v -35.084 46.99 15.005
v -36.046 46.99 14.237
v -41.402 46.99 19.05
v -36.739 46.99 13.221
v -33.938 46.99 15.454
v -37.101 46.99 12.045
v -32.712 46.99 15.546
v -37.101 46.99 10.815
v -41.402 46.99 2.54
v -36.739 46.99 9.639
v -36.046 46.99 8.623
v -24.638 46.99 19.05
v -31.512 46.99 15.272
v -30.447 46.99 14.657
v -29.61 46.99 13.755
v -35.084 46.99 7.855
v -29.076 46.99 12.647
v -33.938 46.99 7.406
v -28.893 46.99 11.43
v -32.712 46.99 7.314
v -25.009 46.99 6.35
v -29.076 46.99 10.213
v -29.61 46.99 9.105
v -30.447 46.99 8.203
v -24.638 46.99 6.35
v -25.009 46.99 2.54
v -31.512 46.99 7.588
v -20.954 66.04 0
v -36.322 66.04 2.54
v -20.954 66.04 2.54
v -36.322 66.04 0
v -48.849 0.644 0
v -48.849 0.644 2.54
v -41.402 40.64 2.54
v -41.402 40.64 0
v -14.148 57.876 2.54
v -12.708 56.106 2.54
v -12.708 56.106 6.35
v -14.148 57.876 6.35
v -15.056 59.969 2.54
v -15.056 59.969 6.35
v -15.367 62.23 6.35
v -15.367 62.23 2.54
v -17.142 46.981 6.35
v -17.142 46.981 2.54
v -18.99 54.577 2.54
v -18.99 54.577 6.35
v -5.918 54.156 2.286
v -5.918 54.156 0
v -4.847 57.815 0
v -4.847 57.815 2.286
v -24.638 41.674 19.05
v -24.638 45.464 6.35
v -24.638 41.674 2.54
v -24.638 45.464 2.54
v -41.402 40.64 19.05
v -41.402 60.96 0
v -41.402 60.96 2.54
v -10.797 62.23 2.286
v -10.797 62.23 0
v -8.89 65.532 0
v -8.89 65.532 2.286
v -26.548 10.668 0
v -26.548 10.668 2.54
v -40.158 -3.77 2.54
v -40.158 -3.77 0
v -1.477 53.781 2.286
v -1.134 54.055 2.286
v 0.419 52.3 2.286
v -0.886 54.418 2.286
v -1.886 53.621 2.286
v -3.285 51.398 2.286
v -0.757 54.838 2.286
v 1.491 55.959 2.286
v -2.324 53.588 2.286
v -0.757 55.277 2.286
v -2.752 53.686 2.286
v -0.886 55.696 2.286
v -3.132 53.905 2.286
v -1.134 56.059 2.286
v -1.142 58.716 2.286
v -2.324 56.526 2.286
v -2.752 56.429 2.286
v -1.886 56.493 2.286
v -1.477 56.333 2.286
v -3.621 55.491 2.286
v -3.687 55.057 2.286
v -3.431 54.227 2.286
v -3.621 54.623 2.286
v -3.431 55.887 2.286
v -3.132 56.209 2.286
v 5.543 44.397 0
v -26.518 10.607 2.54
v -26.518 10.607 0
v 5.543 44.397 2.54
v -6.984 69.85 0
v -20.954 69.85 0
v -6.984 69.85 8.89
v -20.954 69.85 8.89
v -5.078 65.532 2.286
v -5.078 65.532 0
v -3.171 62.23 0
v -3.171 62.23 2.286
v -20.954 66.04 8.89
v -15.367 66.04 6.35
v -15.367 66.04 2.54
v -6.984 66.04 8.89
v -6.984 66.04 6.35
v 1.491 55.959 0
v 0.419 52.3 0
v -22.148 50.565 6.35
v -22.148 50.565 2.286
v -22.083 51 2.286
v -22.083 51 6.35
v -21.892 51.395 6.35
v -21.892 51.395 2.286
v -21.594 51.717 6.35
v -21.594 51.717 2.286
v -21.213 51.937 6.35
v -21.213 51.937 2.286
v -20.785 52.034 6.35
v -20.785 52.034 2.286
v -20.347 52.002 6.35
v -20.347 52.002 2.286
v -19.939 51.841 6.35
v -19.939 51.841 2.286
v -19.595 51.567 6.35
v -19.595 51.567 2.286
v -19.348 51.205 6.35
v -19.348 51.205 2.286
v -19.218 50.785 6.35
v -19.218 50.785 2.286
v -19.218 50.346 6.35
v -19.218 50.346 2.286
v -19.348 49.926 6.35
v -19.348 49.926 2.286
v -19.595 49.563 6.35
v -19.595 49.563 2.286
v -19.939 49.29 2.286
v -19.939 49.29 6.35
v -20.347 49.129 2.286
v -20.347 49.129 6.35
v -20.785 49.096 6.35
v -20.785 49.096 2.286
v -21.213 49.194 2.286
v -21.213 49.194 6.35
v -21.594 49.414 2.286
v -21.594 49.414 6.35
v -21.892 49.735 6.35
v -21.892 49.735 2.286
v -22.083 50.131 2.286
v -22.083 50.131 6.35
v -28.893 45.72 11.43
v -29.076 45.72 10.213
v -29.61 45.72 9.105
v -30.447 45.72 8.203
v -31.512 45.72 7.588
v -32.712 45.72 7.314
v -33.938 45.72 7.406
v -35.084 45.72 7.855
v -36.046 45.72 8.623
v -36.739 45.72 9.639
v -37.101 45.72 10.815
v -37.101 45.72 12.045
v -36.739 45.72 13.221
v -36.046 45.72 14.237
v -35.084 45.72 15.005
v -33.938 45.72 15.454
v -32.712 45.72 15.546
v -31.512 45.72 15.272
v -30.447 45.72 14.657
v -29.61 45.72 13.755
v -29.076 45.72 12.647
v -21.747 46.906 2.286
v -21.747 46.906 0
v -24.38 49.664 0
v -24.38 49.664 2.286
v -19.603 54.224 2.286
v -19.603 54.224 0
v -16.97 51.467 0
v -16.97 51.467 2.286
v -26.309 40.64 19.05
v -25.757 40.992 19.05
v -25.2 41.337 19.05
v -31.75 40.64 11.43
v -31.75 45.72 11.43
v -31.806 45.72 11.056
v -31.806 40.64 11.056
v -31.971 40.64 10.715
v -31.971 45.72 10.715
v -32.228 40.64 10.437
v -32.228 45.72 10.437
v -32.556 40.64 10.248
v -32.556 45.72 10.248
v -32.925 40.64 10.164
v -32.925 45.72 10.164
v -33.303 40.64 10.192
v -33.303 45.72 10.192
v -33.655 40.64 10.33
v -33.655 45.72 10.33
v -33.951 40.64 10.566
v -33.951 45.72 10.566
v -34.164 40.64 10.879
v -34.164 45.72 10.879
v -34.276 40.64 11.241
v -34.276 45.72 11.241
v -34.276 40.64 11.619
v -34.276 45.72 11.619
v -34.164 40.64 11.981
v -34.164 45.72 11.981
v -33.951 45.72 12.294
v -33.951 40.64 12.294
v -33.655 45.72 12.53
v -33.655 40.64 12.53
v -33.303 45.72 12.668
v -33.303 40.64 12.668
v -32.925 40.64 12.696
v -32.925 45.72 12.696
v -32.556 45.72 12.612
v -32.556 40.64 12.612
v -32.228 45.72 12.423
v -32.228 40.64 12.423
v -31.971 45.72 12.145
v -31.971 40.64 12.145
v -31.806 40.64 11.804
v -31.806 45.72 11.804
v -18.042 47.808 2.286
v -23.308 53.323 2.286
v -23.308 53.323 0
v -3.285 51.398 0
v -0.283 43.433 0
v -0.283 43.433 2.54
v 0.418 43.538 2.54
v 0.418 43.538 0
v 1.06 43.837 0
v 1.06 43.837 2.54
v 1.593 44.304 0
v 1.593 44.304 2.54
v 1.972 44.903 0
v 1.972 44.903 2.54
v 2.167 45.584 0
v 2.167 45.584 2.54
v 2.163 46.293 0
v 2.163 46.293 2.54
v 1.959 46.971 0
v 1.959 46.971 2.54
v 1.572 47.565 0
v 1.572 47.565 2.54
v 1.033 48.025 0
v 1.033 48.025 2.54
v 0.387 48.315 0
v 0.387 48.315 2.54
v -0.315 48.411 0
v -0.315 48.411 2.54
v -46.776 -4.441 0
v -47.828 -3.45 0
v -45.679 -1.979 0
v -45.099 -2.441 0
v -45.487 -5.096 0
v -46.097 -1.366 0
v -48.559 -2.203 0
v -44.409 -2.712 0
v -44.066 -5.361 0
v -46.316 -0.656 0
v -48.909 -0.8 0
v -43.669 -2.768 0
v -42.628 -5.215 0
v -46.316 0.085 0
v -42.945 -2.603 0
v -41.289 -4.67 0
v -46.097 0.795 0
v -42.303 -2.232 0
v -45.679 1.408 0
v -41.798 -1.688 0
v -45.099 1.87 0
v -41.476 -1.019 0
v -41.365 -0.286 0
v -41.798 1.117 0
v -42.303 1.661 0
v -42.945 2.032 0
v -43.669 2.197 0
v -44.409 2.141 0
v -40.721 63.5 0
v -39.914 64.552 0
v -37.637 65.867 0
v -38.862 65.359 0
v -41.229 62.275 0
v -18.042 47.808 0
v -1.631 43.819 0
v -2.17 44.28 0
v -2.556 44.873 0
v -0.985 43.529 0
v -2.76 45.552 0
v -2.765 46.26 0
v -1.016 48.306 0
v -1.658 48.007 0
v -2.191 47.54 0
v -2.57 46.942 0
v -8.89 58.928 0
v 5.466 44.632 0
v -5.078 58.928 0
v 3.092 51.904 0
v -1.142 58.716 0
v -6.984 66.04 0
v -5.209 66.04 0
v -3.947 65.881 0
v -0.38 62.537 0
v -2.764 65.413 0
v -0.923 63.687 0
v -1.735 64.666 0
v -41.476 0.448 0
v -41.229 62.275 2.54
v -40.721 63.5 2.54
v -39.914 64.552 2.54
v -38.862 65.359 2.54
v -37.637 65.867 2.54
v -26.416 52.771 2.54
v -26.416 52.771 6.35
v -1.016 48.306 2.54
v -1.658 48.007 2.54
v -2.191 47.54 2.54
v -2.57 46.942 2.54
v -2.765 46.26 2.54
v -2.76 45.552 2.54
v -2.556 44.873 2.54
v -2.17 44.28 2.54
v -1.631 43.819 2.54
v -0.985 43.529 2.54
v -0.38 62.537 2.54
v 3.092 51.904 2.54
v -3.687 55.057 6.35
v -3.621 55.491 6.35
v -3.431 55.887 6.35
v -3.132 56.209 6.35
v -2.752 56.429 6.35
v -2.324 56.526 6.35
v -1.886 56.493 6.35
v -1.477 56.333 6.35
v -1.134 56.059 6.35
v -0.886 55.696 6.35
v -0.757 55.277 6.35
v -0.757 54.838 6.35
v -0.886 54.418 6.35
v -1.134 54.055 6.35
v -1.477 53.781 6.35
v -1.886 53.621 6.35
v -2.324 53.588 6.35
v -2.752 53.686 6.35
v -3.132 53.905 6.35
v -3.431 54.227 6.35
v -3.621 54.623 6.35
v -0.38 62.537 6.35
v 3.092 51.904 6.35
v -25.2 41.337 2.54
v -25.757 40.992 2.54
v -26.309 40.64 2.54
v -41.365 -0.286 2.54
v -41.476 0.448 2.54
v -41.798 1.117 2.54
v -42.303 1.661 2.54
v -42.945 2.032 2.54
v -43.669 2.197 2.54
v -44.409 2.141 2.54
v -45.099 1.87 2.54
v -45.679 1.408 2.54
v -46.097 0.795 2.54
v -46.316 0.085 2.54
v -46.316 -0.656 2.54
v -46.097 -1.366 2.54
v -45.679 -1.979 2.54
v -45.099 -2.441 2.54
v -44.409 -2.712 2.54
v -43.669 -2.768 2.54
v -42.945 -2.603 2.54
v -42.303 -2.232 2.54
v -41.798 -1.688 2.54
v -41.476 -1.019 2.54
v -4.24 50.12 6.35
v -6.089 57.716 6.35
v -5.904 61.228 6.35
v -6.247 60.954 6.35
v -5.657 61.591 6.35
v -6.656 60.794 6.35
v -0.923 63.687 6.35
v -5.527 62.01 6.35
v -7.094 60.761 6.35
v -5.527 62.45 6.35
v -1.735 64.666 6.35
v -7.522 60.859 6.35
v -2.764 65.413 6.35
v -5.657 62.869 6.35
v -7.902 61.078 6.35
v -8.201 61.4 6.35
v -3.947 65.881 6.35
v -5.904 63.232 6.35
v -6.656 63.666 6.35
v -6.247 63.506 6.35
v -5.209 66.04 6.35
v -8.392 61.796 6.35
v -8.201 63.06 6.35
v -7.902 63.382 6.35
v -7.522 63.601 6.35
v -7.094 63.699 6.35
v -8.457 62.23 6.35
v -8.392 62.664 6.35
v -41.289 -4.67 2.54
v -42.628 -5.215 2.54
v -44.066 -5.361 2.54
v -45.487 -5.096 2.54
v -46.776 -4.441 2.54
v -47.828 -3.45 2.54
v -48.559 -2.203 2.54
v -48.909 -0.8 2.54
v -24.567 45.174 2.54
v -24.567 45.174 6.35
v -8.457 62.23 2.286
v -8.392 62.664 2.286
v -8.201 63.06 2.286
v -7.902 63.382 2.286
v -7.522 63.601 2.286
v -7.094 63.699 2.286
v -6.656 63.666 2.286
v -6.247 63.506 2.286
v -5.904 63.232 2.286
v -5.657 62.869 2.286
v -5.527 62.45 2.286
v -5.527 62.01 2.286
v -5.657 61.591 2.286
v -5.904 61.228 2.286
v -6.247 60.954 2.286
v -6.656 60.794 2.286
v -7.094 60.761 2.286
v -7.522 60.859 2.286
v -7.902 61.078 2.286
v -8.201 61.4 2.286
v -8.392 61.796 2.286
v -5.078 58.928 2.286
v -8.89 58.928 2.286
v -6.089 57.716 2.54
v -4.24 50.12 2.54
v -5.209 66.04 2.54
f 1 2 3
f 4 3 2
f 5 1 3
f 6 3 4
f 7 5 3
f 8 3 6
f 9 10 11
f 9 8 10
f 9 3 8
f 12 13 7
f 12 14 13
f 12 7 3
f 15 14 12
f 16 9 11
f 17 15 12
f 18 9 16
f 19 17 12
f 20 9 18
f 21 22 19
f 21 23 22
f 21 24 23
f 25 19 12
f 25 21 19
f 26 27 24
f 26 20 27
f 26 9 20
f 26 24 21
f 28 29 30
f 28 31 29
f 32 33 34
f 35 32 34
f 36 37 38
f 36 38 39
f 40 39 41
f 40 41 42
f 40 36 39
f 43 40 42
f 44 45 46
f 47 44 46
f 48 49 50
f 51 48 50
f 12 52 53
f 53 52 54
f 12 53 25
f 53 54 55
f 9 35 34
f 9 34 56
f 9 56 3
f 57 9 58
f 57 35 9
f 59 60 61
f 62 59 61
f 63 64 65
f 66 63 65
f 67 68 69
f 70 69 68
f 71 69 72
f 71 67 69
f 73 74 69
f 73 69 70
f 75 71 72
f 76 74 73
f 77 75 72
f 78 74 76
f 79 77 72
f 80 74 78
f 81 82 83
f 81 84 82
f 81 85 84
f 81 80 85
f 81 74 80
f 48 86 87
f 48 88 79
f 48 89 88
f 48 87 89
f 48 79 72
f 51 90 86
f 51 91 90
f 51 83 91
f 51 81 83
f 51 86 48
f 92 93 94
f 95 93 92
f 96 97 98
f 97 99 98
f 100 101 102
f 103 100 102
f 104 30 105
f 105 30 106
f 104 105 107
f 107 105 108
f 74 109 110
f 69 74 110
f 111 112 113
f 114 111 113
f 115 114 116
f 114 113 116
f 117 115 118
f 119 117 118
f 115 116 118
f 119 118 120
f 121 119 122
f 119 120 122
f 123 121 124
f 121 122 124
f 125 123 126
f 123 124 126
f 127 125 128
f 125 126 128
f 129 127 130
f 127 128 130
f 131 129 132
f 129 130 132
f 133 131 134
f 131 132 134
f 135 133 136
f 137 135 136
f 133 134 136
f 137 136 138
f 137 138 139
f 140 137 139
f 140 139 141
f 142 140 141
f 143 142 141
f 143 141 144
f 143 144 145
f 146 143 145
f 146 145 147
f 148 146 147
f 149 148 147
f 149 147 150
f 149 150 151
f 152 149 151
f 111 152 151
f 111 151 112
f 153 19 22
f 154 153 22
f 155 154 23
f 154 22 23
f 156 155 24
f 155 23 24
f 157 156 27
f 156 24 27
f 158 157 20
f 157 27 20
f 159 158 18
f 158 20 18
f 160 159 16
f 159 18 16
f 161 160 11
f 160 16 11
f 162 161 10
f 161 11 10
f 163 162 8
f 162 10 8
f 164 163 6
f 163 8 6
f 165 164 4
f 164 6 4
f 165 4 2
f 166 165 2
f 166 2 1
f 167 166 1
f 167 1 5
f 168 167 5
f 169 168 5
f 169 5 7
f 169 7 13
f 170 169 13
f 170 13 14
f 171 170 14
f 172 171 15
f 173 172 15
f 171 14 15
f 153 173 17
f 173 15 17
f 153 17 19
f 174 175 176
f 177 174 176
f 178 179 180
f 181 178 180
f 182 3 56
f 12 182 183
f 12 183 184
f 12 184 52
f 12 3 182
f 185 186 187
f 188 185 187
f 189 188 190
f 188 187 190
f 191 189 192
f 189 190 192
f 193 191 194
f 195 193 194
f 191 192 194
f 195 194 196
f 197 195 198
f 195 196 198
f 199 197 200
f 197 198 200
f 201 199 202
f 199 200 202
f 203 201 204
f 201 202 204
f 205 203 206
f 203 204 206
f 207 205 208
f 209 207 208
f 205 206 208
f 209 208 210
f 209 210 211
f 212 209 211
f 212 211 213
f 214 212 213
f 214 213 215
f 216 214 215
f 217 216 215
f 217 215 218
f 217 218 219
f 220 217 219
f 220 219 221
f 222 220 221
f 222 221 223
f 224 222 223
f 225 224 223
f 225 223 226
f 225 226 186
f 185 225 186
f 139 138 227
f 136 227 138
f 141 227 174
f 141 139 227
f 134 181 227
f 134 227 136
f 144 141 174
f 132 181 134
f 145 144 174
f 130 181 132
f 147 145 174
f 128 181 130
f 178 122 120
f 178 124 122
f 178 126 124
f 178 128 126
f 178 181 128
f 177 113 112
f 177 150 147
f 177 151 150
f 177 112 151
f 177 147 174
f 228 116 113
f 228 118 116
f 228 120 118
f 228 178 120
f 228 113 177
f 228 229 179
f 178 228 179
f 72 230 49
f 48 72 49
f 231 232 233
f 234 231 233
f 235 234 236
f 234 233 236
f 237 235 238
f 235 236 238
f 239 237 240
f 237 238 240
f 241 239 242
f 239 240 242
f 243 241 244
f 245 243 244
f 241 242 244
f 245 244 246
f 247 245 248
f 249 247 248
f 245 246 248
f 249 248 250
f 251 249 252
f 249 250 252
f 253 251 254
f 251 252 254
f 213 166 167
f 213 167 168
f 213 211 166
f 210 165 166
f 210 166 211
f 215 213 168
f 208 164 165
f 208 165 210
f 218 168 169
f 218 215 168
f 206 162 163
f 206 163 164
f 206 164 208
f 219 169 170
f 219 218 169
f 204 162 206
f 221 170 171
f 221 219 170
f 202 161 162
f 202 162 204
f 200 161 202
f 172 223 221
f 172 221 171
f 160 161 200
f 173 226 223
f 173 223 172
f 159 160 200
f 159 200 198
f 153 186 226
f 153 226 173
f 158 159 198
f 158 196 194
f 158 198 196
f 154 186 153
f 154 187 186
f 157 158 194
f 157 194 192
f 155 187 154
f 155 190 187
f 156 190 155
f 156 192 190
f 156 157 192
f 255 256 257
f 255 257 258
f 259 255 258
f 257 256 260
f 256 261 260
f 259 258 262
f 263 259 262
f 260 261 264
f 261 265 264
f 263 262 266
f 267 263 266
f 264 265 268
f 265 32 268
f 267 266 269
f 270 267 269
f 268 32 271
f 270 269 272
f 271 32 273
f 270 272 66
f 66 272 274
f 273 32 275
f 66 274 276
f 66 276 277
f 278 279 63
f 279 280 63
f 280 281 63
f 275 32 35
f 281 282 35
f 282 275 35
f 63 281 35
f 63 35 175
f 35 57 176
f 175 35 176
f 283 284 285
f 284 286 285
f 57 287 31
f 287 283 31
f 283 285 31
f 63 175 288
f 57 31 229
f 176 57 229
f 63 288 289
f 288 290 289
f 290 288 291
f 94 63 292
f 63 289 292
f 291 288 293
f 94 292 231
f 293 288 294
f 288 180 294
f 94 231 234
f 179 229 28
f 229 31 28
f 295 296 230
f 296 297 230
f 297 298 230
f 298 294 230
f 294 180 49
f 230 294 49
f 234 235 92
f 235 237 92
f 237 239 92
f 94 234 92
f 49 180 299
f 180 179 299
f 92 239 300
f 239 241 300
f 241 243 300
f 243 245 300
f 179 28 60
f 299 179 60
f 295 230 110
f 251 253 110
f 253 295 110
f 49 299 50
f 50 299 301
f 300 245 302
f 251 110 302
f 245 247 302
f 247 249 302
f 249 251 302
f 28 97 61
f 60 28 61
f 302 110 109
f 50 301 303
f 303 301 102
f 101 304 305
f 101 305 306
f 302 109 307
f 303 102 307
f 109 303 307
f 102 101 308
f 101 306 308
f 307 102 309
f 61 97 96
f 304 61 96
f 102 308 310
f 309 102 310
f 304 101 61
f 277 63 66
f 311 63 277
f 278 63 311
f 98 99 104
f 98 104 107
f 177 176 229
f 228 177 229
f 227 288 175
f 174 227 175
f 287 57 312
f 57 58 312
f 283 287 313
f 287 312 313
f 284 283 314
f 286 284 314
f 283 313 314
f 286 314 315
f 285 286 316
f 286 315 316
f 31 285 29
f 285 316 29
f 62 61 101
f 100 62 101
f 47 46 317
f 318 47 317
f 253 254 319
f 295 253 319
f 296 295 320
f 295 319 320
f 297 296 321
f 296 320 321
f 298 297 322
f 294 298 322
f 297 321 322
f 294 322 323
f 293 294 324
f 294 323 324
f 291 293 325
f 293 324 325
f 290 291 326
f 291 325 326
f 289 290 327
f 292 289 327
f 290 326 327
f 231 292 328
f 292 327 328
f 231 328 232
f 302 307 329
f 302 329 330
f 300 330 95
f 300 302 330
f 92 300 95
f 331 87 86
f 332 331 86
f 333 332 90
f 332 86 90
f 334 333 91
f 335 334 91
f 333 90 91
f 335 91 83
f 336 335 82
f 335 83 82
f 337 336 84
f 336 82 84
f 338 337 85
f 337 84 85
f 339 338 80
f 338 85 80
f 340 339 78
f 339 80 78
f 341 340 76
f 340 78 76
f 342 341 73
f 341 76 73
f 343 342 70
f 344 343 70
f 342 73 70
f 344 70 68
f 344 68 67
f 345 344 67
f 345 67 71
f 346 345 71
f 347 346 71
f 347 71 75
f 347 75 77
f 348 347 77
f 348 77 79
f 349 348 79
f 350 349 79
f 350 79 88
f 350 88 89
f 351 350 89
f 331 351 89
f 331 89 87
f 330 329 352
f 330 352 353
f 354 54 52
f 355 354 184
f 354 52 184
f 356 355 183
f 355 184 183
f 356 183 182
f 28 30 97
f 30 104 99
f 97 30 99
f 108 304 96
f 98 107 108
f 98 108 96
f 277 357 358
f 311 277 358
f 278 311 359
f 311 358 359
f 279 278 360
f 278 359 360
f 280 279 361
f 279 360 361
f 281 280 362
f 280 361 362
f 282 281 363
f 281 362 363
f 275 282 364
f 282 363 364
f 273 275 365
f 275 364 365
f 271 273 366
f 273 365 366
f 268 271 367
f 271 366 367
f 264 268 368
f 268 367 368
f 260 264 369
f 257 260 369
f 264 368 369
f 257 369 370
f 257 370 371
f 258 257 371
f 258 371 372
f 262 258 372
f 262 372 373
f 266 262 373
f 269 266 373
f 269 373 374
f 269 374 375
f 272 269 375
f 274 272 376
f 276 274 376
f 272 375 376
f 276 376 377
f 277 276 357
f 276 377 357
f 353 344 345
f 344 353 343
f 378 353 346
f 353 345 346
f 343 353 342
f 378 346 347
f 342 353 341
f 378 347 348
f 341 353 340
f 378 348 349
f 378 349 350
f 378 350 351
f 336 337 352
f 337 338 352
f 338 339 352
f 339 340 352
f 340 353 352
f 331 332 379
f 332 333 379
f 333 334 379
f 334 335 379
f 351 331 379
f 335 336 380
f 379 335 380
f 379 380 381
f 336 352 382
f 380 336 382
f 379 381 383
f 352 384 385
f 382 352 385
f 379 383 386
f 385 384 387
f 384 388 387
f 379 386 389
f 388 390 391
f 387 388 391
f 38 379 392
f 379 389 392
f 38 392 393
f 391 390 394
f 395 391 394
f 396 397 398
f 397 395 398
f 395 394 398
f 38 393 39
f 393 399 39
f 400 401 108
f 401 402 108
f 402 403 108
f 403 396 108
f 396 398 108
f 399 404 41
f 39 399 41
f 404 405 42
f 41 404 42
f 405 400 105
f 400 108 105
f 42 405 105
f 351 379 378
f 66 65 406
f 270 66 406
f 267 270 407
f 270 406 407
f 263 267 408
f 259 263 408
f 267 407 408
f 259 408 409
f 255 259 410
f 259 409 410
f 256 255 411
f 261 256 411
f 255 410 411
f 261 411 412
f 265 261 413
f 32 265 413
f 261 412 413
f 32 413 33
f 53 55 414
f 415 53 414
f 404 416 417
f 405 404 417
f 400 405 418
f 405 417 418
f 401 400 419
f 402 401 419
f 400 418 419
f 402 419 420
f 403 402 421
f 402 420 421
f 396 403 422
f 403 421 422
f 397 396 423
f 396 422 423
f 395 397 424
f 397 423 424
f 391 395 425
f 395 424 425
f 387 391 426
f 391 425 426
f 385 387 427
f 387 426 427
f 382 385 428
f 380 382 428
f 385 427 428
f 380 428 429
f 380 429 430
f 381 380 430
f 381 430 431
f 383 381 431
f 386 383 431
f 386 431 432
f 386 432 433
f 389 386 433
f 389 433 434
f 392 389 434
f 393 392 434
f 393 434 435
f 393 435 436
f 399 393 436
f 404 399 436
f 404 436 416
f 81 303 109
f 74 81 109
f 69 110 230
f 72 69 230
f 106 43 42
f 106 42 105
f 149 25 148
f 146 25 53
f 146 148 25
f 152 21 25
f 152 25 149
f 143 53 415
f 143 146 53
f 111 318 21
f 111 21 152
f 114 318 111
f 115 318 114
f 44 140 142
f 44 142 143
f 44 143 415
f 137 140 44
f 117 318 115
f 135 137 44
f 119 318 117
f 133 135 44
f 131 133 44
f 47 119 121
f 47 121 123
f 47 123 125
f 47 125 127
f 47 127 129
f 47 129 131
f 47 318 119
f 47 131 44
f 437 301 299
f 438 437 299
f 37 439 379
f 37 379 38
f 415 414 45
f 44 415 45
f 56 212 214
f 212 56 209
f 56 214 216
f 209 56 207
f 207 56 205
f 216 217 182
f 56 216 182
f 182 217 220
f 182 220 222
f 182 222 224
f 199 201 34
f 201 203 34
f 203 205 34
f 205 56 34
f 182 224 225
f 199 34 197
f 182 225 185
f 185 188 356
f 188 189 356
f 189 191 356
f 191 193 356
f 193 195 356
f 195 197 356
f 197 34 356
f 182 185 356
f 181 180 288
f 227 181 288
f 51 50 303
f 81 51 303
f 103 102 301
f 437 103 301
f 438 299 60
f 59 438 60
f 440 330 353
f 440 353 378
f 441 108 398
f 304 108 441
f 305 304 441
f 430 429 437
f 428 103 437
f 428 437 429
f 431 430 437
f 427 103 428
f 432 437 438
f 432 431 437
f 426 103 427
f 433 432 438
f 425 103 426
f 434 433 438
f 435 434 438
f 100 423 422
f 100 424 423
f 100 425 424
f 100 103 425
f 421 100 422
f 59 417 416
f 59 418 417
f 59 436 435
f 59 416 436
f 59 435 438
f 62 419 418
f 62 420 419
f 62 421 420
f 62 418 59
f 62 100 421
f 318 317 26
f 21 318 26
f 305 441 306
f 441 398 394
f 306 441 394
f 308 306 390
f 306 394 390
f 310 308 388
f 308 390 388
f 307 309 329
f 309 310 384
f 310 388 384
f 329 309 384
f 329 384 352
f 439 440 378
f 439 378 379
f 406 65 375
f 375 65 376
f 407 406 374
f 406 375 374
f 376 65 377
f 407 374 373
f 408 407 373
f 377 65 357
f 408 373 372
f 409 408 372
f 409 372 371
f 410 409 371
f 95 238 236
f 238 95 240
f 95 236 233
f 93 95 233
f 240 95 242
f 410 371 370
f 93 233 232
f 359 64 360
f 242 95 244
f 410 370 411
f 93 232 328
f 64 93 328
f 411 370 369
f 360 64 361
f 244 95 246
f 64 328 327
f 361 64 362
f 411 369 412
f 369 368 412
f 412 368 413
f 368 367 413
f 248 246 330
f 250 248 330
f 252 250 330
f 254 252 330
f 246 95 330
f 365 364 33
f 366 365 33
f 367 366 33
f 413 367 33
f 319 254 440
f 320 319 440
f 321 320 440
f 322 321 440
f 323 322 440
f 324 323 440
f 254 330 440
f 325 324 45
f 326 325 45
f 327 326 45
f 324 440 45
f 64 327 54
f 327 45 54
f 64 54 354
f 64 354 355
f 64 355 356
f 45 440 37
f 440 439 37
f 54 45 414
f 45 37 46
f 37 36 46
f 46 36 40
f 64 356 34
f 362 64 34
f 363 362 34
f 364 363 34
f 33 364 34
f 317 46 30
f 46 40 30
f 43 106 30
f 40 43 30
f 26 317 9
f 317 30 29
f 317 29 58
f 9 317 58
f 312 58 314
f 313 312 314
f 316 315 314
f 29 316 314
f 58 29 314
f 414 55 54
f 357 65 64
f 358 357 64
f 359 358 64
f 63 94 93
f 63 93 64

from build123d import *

# Parameters (mm, degrees)
SKETCH2_R                = 3.81
BOSS_EXTRUDE1_DEPTH      = 2.54
SKETCH5_W                = 16.764
SKETCH5_H                = 6.35
BOSS_EXTRUDE2_DEPTH      = 16.51
SKETCH6_R                = 4.1275
CUT_EXTRUDE2_DEPTH       = 1.27
SKETCH7_R                = 1.27
CUT_EXTRUDE3_DEPTH       = 65.77
CUT_EXTRUDE4_DEPTH       = 2.286
BOSS_EXTRUDE3_DEPTH      = 3.81
F_4_CLEARANCE_HOLE1_D    = 2.9464
SKETCH14_W               = 13.97
SKETCH14_H               = 3.81
BOSS_EXTRUDE6_DEPTH      = 6.35
BOSS_EXTRUDE6_DEPTH_BACK = 2.54
FILLET1_R                = 5.08
CUT_EXTRUDE5_DEPTH       = 17.51
CUT_EXTRUDE5_DEPTH_BACK  = 3.54
SKETCH19_R               = 2.4892
BOSS_EXTRUDE8_DEPTH      = 2.54
CUT_EXTRUDE8_DEPTH       = 2.54


with BuildPart() as part:
    # Sketch2 → Boss-Extrude1 (new body)
    with BuildSketch(Plane.XY):
        with BuildLine():
            Line((-17.068825413, -8.459178389), (-41.402, 40.64))
            Line((-41.402, 40.64), (-41.402, 66.04))
            Line((-41.402, 66.04), (-1.524, 66.04))
            Line((-1.524, 66.04), (18.109053667, 5.913093546))
            ThreePointArc((18.109053667, 5.913093546), (7.204933647, -17.634949139), (-17.068825413, -8.459178389))
        make_face()
        Circle(SKETCH2_R, mode=Mode.SUBTRACT)
    extrude(amount=BOSS_EXTRUDE1_DEPTH)

    # Sketch5 → Boss-Extrude2 (add)
    with BuildSketch(Plane.XY.offset(2.54)):
        with Locations((-33.02, 43.815)):
            Rectangle(SKETCH5_W, SKETCH5_H)
    extrude(amount=BOSS_EXTRUDE2_DEPTH)

    # Sketch6 → Cut-Extrude2 (cut)
    with BuildSketch(Plane(origin=(0, 46.99, 0), x_dir=(1, 0, 0), z_dir=(0, 1, 0))):
        with Locations((-33.02, -11.43)):
            Circle(SKETCH6_R)
    extrude(amount=-CUT_EXTRUDE2_DEPTH, mode=Mode.SUBTRACT)

    # Sketch7 → Cut-Extrude3 (cut, through all)
    with BuildSketch(Plane(origin=(0, 45.72, 0), x_dir=(1, 0, 0), z_dir=(0, 1, 0))):
        with Locations((-33.02, -11.43)):
            Circle(SKETCH7_R)
    extrude(amount=-CUT_EXTRUDE3_DEPTH, mode=Mode.SUBTRACT)

    # Sketch9 → Cut-Extrude4 (cut)
    with BuildSketch(Plane(origin=(0, 0, 0), x_dir=(-1, 0, 0), z_dir=(0, 0, -1))):
        Polygon((3.171122265, 62.23), (5.077532854, 58.928), (8.890354032, 58.928), (10.796764621, 62.23), (8.890354032, 65.532), (5.077532854, 65.532), align=None)
        Polygon((24.379877895, 49.663956202), (23.308143816, 53.323053276), (19.603405755, 54.224452874), (16.970401774, 51.466755398), (18.042135853, 47.807658324), (21.746873914, 46.906258726), align=None)
        Polygon((5.918476139, 54.15579827), (4.846742059, 57.814895344), (1.142003999, 58.716294942), (-1.490999983, 55.958597466), (-0.419265903, 52.299500392), (3.285472157, 51.398100794), align=None)
    extrude(amount=-CUT_EXTRUDE4_DEPTH, mode=Mode.SUBTRACT)

    # Sketch8 → Boss-Extrude3 (add)
    with BuildSketch(Plane.XY.offset(2.54)):
        with BuildLine():
            Line((-15.367, 66.04), (-6.983943443, 66.04))
            Line((-6.983943443, 66.04), (-1.524, 66.04))
            Line((-1.524, 66.04), (3.09175139, 51.904101595))
            Line((3.09175139, 51.904101595), (-4.240438106, 50.120107003))
            Line((-4.240438106, 50.120107003), (-6.088713216, 57.716488409))
            Line((-6.088713216, 57.716488409), (-12.708473154, 56.10583501))
            ThreePointArc((-12.708473154, 56.10583501), (-14.673699407, 58.891843255), (-15.367, 62.23))
            Line((-15.367, 62.23), (-15.367, 66.04))
        make_face()
        Polygon((-17.142042414, 46.981018422), (-18.990317524, 54.577399829), (-26.415687706, 52.770733449), (-24.567412596, 45.174352043), align=None)
    extrude(amount=BOSS_EXTRUDE3_DEPTH)

    # #4 Clearance Hole1 (through all)
    with Locations(Plane.XY.offset(6.35)):
        with Locations((-6.983943443, 62.23), (-20.675139834, 50.5653558), (-2.213738078, 55.057197868)):
            Hole(F_4_CLEARANCE_HOLE1_D / 2)

    # Sketch14 → Boss-Extrude6 (add, two sides)
    with BuildSketch(Plane.XY.offset(2.54)) as boss_extrude6_sk:
        with Locations((-13.968943443, 67.945)):
            Rectangle(SKETCH14_W, SKETCH14_H)
    extrude(amount=BOSS_EXTRUDE6_DEPTH)
    extrude(boss_extrude6_sk.sketch, amount=-BOSS_EXTRUDE6_DEPTH_BACK)

    # Fillet1
    fillet1_edges = [part.edges().sort_by_distance(p)[0] for p in [
        (-41.402, 66.04, 1.27),
        (-1.524, 66.04, 3.175),
    ]]
    fillet(fillet1_edges, radius=FILLET1_R)

    # Sketch15 → Cut-Extrude5 (cut, two sides)
    with BuildSketch(Plane.XY.offset(2.54)) as cut_extrude5_sk:
        with BuildLine():
            ThreePointArc((-0.315167053, 48.411374113), (-18.310138041, 44.816284079), (-33.674369734, 34.782140486))
            ThreePointArc((-33.674369734, 34.782140486), (-33.731327517, 31.262340905), (-30.211527936, 31.205383122))
            ThreePointArc((-30.211527936, 31.205383122), (-16.427248714, 40.207684038), (-0.28275743, 43.433079608))
            ThreePointArc((-0.28275743, 43.433079608), (2.190185011, 45.938431672), (-0.315167053, 48.411374113))
        make_face()
    extrude(amount=CUT_EXTRUDE5_DEPTH, mode=Mode.SUBTRACT)
    extrude(cut_extrude5_sk.sketch, amount=-CUT_EXTRUDE5_DEPTH_BACK, mode=Mode.SUBTRACT)

    # Sketch19 → Boss-Extrude8 (add, through all)
    with BuildSketch(Plane.XY.offset(2.54)):
        with BuildLine():
            Line((5.466200245, 44.632269783), (-40.158007355, -3.769954845))
            ThreePointArc((-40.158007355, -3.769954845), (-46.15516131, -4.814733016), (-48.848797168, 0.64436424))
            Line((-48.848797168, 0.64436424), (-41.402, 40.64))
            Line((-41.402, 40.64), (3.09175139, 51.904101595))
            Line((3.09175139, 51.904101595), (5.466200245, 44.632269783))
        make_face()
        with Locations((-0.298962241, 45.92222686)):
            Circle(SKETCH19_R, mode=Mode.SUBTRACT)
        with Locations((-43.854625645, -0.285501773)):
            Circle(SKETCH19_R, mode=Mode.SUBTRACT)
    extrude(amount=-BOSS_EXTRUDE8_DEPTH)

    # Sketch20 → Cut-Extrude8 (cut)
    with BuildSketch(Plane.XY.offset(2.54)):
        Polygon((-40.158007355, -3.769954845), (10.729493517, 49.863783044), (48.07174347, 14.433588323), (-7.673080914, -44.319607422), align=None)
    extrude(amount=-CUT_EXTRUDE8_DEPTH, mode=Mode.SUBTRACT)


solid = part.part
